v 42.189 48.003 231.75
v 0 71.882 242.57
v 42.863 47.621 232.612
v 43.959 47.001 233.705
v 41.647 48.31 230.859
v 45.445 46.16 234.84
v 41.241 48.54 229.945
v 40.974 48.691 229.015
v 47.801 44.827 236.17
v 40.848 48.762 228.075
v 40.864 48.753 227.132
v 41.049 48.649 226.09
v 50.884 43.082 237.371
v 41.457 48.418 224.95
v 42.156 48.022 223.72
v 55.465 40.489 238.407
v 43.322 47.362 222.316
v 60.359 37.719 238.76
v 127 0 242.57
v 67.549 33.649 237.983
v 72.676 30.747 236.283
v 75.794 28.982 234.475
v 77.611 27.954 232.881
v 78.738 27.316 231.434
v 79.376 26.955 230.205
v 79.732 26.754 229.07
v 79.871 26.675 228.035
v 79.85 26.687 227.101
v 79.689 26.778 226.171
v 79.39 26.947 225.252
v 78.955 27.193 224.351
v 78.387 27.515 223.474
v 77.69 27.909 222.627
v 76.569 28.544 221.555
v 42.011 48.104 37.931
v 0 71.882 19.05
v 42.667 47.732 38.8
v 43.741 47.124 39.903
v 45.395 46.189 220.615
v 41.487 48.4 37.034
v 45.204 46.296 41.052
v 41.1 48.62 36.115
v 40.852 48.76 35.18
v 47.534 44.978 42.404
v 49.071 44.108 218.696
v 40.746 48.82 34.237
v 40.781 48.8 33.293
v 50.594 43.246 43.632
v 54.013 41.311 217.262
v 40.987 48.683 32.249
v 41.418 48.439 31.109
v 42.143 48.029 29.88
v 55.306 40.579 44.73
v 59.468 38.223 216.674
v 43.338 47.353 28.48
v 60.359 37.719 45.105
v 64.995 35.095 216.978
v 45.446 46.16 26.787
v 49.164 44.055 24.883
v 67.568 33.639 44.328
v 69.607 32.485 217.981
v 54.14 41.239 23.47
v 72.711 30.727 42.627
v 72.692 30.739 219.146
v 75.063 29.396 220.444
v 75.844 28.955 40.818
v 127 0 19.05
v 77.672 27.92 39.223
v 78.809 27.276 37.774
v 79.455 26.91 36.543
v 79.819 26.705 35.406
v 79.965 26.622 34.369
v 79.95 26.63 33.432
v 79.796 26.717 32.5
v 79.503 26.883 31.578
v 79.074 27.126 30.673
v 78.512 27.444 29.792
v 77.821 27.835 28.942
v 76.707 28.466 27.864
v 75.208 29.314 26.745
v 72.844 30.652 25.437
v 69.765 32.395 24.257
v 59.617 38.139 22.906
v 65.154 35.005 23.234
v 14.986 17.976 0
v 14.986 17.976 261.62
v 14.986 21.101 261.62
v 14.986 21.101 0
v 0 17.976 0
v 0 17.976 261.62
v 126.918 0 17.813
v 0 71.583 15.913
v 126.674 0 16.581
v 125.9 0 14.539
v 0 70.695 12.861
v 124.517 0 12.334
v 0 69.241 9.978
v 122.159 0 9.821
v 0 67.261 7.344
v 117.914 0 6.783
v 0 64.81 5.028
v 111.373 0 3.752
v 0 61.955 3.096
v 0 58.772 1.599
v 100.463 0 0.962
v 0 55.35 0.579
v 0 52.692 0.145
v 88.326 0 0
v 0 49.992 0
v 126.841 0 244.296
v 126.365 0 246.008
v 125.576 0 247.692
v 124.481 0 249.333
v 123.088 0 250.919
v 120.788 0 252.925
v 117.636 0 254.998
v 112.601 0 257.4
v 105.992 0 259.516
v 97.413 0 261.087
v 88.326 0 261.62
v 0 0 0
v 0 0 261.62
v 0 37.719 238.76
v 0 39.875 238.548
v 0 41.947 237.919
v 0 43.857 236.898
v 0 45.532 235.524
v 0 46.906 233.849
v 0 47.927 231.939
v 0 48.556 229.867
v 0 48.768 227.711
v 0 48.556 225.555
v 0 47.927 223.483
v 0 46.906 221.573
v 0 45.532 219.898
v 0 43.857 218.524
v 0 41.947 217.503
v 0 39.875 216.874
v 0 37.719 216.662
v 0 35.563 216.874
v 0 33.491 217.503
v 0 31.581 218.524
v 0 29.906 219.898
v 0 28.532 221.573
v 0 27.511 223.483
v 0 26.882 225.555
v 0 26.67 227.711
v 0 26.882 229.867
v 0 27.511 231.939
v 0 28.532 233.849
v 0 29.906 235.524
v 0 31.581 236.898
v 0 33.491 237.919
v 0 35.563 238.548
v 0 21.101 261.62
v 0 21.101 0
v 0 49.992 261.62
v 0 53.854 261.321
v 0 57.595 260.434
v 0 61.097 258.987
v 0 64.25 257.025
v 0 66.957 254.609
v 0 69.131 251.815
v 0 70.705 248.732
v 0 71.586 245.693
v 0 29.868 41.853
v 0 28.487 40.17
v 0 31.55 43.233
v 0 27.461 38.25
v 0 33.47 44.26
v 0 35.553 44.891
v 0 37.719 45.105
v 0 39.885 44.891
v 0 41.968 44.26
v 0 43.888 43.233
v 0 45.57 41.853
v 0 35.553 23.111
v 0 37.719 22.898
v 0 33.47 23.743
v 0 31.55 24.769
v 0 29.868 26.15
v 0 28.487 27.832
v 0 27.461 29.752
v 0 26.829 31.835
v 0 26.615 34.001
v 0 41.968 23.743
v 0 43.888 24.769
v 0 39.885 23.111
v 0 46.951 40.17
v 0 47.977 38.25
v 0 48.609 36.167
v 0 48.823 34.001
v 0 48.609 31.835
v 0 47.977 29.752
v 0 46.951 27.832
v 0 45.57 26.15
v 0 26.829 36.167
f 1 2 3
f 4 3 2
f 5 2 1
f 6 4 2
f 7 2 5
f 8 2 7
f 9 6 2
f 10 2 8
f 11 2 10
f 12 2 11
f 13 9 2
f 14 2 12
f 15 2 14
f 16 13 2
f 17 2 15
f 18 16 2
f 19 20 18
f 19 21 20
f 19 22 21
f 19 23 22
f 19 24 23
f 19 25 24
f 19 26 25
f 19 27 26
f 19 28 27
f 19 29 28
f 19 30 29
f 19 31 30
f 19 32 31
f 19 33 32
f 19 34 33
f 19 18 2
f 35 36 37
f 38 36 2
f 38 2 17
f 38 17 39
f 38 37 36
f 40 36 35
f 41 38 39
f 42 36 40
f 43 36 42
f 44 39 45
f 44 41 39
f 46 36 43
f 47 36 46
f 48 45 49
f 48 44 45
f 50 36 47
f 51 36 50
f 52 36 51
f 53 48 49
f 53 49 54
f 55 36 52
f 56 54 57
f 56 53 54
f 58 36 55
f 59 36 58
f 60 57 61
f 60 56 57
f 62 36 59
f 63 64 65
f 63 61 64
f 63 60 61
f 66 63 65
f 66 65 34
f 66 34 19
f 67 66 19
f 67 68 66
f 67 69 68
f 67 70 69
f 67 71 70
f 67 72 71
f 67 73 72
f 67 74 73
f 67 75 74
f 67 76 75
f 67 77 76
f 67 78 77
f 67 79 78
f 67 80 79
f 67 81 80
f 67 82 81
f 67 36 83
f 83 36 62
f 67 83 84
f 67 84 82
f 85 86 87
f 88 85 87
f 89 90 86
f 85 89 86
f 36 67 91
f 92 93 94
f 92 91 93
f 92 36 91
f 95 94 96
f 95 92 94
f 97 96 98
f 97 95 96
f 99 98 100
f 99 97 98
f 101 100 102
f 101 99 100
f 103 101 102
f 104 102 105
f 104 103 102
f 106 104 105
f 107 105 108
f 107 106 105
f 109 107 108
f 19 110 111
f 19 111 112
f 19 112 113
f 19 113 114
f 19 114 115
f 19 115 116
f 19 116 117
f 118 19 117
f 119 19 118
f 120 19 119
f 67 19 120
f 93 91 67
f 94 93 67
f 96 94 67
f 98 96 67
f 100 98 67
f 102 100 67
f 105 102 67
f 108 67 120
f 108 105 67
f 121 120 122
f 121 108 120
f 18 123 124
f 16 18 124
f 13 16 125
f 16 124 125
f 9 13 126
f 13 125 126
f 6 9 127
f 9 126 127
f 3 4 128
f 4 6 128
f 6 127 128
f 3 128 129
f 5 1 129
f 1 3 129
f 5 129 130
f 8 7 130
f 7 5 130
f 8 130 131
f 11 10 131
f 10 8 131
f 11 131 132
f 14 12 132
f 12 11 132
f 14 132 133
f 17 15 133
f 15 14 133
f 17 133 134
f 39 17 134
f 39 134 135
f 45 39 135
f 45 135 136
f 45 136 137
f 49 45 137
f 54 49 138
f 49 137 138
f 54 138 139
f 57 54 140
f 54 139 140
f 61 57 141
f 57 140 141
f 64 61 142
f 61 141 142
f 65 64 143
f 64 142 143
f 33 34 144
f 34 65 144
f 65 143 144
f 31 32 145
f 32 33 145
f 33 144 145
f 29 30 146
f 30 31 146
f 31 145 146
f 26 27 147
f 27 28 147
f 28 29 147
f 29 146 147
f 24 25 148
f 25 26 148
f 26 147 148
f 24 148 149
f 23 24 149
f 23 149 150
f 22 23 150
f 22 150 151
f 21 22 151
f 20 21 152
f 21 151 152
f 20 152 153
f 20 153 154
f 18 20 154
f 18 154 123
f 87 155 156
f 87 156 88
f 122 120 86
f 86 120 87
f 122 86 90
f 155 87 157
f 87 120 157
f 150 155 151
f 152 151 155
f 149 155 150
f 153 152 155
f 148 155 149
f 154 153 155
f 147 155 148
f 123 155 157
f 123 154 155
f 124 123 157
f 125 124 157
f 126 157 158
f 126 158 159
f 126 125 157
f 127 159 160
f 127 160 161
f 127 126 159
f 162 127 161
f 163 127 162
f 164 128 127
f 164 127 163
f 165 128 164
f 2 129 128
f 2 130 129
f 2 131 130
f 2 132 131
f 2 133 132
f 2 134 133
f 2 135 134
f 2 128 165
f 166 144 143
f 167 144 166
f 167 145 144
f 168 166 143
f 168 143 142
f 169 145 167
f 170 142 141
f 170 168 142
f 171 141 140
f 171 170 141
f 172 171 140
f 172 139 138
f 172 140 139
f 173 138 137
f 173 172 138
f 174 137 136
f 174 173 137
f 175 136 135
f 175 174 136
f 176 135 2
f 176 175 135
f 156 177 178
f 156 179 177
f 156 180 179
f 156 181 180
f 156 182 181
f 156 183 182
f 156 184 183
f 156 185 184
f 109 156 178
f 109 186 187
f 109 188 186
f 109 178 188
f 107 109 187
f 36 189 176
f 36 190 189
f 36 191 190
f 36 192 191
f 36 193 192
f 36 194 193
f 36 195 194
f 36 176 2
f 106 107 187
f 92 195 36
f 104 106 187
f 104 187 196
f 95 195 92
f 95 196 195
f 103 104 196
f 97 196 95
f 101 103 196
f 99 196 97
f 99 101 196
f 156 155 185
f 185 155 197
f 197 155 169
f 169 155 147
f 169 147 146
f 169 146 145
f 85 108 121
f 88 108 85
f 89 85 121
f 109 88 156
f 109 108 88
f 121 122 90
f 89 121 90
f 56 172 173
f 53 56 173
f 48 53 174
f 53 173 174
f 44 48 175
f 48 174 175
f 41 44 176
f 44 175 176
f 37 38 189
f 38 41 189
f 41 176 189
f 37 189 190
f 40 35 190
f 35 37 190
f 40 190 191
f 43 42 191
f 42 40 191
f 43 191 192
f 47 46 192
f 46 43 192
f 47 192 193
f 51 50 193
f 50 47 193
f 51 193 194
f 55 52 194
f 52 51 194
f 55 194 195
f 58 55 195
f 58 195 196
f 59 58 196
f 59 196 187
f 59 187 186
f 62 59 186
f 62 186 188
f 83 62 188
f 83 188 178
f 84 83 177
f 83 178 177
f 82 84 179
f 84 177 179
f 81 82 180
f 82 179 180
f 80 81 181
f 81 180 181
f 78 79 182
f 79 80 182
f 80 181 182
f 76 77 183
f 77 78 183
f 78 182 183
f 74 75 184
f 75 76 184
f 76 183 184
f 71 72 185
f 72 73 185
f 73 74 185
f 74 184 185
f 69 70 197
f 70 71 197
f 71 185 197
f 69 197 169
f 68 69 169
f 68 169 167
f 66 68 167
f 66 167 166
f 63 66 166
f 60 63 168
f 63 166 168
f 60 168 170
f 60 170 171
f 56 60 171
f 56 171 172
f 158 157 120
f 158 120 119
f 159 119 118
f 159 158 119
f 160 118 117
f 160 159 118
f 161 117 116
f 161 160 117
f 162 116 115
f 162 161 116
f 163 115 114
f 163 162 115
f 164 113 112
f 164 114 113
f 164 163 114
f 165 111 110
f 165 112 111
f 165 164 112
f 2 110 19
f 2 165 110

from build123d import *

# Parameters (mm, degrees)
BOSS_EXTRUDE1_DEPTH = 261.62
SKETCH3_R           = 11.049
SKETCH3_R_2         = 11.103550021
CUT_EXTRUDE2_DEPTH  = 109.728
SKETCH2_W           = 14.986
SKETCH2_H           = 3.124293054
CUT_EXTRUDE3_DEPTH  = 268.224
VARFILLET1_START    = -36
VARFILLET1_DEPTH    = 148


with BuildPart() as part:
    # Sketch1 → Boss-Extrude1 (new body)
    with BuildSketch(Plane.XY):
        Polygon((0, 0), (0, 71.882), (127, 0), align=None)
    extrude(amount=BOSS_EXTRUDE1_DEPTH)

    # Sketch3 → Cut-Extrude2 (cut)
    with BuildSketch(Plane.ZY):
        with Locations((227.711, 37.719)):
            Circle(SKETCH3_R)
        with Locations((34.001176145, 37.719)):
            Circle(SKETCH3_R_2)
    extrude(amount=-CUT_EXTRUDE2_DEPTH, mode=Mode.SUBTRACT)

    # Sketch2 → Cut-Extrude3 (cut)
    with BuildSketch(Plane.XY.offset(261.62)):
        with Locations((7.493, 19.538461467)):
            Rectangle(SKETCH2_W, SKETCH2_H)
    extrude(amount=-CUT_EXTRUDE3_DEPTH, mode=Mode.SUBTRACT)

    # VarFillet1: read off the stored shape, not the designer's step
    # VarFillet1 outline → VarFillet1 (cut)
    with BuildSketch(Plane(origin=(0, 0, 0), x_dir=(0.4925733480628631, 0.8702709329732561, 0), z_dir=(0.8702709329732561, -0.49257334806286307, 0)).offset(VARFILLET1_START)):
        with BuildLine():
            Line((62.556815204, 0), (62.556815204, 19.05))
            ThreePointArc((62.556815204, 19.05), (56.977199386, 5.579615818), (43.506815204, 0))
            Line((43.506815204, 0), (62.556815204, 0))
        make_face()
        with BuildLine():
            ThreePointArc((43.506815204, 261.62), (56.977199386, 256.040384182), (62.556815204, 242.57))
            Line((62.556815204, 242.57), (62.556815204, 261.62))
            Line((62.556815204, 261.62), (43.506815204, 261.62))
        make_face()
    extrude(amount=VARFILLET1_DEPTH, mode=Mode.SUBTRACT)


solid = part.part
